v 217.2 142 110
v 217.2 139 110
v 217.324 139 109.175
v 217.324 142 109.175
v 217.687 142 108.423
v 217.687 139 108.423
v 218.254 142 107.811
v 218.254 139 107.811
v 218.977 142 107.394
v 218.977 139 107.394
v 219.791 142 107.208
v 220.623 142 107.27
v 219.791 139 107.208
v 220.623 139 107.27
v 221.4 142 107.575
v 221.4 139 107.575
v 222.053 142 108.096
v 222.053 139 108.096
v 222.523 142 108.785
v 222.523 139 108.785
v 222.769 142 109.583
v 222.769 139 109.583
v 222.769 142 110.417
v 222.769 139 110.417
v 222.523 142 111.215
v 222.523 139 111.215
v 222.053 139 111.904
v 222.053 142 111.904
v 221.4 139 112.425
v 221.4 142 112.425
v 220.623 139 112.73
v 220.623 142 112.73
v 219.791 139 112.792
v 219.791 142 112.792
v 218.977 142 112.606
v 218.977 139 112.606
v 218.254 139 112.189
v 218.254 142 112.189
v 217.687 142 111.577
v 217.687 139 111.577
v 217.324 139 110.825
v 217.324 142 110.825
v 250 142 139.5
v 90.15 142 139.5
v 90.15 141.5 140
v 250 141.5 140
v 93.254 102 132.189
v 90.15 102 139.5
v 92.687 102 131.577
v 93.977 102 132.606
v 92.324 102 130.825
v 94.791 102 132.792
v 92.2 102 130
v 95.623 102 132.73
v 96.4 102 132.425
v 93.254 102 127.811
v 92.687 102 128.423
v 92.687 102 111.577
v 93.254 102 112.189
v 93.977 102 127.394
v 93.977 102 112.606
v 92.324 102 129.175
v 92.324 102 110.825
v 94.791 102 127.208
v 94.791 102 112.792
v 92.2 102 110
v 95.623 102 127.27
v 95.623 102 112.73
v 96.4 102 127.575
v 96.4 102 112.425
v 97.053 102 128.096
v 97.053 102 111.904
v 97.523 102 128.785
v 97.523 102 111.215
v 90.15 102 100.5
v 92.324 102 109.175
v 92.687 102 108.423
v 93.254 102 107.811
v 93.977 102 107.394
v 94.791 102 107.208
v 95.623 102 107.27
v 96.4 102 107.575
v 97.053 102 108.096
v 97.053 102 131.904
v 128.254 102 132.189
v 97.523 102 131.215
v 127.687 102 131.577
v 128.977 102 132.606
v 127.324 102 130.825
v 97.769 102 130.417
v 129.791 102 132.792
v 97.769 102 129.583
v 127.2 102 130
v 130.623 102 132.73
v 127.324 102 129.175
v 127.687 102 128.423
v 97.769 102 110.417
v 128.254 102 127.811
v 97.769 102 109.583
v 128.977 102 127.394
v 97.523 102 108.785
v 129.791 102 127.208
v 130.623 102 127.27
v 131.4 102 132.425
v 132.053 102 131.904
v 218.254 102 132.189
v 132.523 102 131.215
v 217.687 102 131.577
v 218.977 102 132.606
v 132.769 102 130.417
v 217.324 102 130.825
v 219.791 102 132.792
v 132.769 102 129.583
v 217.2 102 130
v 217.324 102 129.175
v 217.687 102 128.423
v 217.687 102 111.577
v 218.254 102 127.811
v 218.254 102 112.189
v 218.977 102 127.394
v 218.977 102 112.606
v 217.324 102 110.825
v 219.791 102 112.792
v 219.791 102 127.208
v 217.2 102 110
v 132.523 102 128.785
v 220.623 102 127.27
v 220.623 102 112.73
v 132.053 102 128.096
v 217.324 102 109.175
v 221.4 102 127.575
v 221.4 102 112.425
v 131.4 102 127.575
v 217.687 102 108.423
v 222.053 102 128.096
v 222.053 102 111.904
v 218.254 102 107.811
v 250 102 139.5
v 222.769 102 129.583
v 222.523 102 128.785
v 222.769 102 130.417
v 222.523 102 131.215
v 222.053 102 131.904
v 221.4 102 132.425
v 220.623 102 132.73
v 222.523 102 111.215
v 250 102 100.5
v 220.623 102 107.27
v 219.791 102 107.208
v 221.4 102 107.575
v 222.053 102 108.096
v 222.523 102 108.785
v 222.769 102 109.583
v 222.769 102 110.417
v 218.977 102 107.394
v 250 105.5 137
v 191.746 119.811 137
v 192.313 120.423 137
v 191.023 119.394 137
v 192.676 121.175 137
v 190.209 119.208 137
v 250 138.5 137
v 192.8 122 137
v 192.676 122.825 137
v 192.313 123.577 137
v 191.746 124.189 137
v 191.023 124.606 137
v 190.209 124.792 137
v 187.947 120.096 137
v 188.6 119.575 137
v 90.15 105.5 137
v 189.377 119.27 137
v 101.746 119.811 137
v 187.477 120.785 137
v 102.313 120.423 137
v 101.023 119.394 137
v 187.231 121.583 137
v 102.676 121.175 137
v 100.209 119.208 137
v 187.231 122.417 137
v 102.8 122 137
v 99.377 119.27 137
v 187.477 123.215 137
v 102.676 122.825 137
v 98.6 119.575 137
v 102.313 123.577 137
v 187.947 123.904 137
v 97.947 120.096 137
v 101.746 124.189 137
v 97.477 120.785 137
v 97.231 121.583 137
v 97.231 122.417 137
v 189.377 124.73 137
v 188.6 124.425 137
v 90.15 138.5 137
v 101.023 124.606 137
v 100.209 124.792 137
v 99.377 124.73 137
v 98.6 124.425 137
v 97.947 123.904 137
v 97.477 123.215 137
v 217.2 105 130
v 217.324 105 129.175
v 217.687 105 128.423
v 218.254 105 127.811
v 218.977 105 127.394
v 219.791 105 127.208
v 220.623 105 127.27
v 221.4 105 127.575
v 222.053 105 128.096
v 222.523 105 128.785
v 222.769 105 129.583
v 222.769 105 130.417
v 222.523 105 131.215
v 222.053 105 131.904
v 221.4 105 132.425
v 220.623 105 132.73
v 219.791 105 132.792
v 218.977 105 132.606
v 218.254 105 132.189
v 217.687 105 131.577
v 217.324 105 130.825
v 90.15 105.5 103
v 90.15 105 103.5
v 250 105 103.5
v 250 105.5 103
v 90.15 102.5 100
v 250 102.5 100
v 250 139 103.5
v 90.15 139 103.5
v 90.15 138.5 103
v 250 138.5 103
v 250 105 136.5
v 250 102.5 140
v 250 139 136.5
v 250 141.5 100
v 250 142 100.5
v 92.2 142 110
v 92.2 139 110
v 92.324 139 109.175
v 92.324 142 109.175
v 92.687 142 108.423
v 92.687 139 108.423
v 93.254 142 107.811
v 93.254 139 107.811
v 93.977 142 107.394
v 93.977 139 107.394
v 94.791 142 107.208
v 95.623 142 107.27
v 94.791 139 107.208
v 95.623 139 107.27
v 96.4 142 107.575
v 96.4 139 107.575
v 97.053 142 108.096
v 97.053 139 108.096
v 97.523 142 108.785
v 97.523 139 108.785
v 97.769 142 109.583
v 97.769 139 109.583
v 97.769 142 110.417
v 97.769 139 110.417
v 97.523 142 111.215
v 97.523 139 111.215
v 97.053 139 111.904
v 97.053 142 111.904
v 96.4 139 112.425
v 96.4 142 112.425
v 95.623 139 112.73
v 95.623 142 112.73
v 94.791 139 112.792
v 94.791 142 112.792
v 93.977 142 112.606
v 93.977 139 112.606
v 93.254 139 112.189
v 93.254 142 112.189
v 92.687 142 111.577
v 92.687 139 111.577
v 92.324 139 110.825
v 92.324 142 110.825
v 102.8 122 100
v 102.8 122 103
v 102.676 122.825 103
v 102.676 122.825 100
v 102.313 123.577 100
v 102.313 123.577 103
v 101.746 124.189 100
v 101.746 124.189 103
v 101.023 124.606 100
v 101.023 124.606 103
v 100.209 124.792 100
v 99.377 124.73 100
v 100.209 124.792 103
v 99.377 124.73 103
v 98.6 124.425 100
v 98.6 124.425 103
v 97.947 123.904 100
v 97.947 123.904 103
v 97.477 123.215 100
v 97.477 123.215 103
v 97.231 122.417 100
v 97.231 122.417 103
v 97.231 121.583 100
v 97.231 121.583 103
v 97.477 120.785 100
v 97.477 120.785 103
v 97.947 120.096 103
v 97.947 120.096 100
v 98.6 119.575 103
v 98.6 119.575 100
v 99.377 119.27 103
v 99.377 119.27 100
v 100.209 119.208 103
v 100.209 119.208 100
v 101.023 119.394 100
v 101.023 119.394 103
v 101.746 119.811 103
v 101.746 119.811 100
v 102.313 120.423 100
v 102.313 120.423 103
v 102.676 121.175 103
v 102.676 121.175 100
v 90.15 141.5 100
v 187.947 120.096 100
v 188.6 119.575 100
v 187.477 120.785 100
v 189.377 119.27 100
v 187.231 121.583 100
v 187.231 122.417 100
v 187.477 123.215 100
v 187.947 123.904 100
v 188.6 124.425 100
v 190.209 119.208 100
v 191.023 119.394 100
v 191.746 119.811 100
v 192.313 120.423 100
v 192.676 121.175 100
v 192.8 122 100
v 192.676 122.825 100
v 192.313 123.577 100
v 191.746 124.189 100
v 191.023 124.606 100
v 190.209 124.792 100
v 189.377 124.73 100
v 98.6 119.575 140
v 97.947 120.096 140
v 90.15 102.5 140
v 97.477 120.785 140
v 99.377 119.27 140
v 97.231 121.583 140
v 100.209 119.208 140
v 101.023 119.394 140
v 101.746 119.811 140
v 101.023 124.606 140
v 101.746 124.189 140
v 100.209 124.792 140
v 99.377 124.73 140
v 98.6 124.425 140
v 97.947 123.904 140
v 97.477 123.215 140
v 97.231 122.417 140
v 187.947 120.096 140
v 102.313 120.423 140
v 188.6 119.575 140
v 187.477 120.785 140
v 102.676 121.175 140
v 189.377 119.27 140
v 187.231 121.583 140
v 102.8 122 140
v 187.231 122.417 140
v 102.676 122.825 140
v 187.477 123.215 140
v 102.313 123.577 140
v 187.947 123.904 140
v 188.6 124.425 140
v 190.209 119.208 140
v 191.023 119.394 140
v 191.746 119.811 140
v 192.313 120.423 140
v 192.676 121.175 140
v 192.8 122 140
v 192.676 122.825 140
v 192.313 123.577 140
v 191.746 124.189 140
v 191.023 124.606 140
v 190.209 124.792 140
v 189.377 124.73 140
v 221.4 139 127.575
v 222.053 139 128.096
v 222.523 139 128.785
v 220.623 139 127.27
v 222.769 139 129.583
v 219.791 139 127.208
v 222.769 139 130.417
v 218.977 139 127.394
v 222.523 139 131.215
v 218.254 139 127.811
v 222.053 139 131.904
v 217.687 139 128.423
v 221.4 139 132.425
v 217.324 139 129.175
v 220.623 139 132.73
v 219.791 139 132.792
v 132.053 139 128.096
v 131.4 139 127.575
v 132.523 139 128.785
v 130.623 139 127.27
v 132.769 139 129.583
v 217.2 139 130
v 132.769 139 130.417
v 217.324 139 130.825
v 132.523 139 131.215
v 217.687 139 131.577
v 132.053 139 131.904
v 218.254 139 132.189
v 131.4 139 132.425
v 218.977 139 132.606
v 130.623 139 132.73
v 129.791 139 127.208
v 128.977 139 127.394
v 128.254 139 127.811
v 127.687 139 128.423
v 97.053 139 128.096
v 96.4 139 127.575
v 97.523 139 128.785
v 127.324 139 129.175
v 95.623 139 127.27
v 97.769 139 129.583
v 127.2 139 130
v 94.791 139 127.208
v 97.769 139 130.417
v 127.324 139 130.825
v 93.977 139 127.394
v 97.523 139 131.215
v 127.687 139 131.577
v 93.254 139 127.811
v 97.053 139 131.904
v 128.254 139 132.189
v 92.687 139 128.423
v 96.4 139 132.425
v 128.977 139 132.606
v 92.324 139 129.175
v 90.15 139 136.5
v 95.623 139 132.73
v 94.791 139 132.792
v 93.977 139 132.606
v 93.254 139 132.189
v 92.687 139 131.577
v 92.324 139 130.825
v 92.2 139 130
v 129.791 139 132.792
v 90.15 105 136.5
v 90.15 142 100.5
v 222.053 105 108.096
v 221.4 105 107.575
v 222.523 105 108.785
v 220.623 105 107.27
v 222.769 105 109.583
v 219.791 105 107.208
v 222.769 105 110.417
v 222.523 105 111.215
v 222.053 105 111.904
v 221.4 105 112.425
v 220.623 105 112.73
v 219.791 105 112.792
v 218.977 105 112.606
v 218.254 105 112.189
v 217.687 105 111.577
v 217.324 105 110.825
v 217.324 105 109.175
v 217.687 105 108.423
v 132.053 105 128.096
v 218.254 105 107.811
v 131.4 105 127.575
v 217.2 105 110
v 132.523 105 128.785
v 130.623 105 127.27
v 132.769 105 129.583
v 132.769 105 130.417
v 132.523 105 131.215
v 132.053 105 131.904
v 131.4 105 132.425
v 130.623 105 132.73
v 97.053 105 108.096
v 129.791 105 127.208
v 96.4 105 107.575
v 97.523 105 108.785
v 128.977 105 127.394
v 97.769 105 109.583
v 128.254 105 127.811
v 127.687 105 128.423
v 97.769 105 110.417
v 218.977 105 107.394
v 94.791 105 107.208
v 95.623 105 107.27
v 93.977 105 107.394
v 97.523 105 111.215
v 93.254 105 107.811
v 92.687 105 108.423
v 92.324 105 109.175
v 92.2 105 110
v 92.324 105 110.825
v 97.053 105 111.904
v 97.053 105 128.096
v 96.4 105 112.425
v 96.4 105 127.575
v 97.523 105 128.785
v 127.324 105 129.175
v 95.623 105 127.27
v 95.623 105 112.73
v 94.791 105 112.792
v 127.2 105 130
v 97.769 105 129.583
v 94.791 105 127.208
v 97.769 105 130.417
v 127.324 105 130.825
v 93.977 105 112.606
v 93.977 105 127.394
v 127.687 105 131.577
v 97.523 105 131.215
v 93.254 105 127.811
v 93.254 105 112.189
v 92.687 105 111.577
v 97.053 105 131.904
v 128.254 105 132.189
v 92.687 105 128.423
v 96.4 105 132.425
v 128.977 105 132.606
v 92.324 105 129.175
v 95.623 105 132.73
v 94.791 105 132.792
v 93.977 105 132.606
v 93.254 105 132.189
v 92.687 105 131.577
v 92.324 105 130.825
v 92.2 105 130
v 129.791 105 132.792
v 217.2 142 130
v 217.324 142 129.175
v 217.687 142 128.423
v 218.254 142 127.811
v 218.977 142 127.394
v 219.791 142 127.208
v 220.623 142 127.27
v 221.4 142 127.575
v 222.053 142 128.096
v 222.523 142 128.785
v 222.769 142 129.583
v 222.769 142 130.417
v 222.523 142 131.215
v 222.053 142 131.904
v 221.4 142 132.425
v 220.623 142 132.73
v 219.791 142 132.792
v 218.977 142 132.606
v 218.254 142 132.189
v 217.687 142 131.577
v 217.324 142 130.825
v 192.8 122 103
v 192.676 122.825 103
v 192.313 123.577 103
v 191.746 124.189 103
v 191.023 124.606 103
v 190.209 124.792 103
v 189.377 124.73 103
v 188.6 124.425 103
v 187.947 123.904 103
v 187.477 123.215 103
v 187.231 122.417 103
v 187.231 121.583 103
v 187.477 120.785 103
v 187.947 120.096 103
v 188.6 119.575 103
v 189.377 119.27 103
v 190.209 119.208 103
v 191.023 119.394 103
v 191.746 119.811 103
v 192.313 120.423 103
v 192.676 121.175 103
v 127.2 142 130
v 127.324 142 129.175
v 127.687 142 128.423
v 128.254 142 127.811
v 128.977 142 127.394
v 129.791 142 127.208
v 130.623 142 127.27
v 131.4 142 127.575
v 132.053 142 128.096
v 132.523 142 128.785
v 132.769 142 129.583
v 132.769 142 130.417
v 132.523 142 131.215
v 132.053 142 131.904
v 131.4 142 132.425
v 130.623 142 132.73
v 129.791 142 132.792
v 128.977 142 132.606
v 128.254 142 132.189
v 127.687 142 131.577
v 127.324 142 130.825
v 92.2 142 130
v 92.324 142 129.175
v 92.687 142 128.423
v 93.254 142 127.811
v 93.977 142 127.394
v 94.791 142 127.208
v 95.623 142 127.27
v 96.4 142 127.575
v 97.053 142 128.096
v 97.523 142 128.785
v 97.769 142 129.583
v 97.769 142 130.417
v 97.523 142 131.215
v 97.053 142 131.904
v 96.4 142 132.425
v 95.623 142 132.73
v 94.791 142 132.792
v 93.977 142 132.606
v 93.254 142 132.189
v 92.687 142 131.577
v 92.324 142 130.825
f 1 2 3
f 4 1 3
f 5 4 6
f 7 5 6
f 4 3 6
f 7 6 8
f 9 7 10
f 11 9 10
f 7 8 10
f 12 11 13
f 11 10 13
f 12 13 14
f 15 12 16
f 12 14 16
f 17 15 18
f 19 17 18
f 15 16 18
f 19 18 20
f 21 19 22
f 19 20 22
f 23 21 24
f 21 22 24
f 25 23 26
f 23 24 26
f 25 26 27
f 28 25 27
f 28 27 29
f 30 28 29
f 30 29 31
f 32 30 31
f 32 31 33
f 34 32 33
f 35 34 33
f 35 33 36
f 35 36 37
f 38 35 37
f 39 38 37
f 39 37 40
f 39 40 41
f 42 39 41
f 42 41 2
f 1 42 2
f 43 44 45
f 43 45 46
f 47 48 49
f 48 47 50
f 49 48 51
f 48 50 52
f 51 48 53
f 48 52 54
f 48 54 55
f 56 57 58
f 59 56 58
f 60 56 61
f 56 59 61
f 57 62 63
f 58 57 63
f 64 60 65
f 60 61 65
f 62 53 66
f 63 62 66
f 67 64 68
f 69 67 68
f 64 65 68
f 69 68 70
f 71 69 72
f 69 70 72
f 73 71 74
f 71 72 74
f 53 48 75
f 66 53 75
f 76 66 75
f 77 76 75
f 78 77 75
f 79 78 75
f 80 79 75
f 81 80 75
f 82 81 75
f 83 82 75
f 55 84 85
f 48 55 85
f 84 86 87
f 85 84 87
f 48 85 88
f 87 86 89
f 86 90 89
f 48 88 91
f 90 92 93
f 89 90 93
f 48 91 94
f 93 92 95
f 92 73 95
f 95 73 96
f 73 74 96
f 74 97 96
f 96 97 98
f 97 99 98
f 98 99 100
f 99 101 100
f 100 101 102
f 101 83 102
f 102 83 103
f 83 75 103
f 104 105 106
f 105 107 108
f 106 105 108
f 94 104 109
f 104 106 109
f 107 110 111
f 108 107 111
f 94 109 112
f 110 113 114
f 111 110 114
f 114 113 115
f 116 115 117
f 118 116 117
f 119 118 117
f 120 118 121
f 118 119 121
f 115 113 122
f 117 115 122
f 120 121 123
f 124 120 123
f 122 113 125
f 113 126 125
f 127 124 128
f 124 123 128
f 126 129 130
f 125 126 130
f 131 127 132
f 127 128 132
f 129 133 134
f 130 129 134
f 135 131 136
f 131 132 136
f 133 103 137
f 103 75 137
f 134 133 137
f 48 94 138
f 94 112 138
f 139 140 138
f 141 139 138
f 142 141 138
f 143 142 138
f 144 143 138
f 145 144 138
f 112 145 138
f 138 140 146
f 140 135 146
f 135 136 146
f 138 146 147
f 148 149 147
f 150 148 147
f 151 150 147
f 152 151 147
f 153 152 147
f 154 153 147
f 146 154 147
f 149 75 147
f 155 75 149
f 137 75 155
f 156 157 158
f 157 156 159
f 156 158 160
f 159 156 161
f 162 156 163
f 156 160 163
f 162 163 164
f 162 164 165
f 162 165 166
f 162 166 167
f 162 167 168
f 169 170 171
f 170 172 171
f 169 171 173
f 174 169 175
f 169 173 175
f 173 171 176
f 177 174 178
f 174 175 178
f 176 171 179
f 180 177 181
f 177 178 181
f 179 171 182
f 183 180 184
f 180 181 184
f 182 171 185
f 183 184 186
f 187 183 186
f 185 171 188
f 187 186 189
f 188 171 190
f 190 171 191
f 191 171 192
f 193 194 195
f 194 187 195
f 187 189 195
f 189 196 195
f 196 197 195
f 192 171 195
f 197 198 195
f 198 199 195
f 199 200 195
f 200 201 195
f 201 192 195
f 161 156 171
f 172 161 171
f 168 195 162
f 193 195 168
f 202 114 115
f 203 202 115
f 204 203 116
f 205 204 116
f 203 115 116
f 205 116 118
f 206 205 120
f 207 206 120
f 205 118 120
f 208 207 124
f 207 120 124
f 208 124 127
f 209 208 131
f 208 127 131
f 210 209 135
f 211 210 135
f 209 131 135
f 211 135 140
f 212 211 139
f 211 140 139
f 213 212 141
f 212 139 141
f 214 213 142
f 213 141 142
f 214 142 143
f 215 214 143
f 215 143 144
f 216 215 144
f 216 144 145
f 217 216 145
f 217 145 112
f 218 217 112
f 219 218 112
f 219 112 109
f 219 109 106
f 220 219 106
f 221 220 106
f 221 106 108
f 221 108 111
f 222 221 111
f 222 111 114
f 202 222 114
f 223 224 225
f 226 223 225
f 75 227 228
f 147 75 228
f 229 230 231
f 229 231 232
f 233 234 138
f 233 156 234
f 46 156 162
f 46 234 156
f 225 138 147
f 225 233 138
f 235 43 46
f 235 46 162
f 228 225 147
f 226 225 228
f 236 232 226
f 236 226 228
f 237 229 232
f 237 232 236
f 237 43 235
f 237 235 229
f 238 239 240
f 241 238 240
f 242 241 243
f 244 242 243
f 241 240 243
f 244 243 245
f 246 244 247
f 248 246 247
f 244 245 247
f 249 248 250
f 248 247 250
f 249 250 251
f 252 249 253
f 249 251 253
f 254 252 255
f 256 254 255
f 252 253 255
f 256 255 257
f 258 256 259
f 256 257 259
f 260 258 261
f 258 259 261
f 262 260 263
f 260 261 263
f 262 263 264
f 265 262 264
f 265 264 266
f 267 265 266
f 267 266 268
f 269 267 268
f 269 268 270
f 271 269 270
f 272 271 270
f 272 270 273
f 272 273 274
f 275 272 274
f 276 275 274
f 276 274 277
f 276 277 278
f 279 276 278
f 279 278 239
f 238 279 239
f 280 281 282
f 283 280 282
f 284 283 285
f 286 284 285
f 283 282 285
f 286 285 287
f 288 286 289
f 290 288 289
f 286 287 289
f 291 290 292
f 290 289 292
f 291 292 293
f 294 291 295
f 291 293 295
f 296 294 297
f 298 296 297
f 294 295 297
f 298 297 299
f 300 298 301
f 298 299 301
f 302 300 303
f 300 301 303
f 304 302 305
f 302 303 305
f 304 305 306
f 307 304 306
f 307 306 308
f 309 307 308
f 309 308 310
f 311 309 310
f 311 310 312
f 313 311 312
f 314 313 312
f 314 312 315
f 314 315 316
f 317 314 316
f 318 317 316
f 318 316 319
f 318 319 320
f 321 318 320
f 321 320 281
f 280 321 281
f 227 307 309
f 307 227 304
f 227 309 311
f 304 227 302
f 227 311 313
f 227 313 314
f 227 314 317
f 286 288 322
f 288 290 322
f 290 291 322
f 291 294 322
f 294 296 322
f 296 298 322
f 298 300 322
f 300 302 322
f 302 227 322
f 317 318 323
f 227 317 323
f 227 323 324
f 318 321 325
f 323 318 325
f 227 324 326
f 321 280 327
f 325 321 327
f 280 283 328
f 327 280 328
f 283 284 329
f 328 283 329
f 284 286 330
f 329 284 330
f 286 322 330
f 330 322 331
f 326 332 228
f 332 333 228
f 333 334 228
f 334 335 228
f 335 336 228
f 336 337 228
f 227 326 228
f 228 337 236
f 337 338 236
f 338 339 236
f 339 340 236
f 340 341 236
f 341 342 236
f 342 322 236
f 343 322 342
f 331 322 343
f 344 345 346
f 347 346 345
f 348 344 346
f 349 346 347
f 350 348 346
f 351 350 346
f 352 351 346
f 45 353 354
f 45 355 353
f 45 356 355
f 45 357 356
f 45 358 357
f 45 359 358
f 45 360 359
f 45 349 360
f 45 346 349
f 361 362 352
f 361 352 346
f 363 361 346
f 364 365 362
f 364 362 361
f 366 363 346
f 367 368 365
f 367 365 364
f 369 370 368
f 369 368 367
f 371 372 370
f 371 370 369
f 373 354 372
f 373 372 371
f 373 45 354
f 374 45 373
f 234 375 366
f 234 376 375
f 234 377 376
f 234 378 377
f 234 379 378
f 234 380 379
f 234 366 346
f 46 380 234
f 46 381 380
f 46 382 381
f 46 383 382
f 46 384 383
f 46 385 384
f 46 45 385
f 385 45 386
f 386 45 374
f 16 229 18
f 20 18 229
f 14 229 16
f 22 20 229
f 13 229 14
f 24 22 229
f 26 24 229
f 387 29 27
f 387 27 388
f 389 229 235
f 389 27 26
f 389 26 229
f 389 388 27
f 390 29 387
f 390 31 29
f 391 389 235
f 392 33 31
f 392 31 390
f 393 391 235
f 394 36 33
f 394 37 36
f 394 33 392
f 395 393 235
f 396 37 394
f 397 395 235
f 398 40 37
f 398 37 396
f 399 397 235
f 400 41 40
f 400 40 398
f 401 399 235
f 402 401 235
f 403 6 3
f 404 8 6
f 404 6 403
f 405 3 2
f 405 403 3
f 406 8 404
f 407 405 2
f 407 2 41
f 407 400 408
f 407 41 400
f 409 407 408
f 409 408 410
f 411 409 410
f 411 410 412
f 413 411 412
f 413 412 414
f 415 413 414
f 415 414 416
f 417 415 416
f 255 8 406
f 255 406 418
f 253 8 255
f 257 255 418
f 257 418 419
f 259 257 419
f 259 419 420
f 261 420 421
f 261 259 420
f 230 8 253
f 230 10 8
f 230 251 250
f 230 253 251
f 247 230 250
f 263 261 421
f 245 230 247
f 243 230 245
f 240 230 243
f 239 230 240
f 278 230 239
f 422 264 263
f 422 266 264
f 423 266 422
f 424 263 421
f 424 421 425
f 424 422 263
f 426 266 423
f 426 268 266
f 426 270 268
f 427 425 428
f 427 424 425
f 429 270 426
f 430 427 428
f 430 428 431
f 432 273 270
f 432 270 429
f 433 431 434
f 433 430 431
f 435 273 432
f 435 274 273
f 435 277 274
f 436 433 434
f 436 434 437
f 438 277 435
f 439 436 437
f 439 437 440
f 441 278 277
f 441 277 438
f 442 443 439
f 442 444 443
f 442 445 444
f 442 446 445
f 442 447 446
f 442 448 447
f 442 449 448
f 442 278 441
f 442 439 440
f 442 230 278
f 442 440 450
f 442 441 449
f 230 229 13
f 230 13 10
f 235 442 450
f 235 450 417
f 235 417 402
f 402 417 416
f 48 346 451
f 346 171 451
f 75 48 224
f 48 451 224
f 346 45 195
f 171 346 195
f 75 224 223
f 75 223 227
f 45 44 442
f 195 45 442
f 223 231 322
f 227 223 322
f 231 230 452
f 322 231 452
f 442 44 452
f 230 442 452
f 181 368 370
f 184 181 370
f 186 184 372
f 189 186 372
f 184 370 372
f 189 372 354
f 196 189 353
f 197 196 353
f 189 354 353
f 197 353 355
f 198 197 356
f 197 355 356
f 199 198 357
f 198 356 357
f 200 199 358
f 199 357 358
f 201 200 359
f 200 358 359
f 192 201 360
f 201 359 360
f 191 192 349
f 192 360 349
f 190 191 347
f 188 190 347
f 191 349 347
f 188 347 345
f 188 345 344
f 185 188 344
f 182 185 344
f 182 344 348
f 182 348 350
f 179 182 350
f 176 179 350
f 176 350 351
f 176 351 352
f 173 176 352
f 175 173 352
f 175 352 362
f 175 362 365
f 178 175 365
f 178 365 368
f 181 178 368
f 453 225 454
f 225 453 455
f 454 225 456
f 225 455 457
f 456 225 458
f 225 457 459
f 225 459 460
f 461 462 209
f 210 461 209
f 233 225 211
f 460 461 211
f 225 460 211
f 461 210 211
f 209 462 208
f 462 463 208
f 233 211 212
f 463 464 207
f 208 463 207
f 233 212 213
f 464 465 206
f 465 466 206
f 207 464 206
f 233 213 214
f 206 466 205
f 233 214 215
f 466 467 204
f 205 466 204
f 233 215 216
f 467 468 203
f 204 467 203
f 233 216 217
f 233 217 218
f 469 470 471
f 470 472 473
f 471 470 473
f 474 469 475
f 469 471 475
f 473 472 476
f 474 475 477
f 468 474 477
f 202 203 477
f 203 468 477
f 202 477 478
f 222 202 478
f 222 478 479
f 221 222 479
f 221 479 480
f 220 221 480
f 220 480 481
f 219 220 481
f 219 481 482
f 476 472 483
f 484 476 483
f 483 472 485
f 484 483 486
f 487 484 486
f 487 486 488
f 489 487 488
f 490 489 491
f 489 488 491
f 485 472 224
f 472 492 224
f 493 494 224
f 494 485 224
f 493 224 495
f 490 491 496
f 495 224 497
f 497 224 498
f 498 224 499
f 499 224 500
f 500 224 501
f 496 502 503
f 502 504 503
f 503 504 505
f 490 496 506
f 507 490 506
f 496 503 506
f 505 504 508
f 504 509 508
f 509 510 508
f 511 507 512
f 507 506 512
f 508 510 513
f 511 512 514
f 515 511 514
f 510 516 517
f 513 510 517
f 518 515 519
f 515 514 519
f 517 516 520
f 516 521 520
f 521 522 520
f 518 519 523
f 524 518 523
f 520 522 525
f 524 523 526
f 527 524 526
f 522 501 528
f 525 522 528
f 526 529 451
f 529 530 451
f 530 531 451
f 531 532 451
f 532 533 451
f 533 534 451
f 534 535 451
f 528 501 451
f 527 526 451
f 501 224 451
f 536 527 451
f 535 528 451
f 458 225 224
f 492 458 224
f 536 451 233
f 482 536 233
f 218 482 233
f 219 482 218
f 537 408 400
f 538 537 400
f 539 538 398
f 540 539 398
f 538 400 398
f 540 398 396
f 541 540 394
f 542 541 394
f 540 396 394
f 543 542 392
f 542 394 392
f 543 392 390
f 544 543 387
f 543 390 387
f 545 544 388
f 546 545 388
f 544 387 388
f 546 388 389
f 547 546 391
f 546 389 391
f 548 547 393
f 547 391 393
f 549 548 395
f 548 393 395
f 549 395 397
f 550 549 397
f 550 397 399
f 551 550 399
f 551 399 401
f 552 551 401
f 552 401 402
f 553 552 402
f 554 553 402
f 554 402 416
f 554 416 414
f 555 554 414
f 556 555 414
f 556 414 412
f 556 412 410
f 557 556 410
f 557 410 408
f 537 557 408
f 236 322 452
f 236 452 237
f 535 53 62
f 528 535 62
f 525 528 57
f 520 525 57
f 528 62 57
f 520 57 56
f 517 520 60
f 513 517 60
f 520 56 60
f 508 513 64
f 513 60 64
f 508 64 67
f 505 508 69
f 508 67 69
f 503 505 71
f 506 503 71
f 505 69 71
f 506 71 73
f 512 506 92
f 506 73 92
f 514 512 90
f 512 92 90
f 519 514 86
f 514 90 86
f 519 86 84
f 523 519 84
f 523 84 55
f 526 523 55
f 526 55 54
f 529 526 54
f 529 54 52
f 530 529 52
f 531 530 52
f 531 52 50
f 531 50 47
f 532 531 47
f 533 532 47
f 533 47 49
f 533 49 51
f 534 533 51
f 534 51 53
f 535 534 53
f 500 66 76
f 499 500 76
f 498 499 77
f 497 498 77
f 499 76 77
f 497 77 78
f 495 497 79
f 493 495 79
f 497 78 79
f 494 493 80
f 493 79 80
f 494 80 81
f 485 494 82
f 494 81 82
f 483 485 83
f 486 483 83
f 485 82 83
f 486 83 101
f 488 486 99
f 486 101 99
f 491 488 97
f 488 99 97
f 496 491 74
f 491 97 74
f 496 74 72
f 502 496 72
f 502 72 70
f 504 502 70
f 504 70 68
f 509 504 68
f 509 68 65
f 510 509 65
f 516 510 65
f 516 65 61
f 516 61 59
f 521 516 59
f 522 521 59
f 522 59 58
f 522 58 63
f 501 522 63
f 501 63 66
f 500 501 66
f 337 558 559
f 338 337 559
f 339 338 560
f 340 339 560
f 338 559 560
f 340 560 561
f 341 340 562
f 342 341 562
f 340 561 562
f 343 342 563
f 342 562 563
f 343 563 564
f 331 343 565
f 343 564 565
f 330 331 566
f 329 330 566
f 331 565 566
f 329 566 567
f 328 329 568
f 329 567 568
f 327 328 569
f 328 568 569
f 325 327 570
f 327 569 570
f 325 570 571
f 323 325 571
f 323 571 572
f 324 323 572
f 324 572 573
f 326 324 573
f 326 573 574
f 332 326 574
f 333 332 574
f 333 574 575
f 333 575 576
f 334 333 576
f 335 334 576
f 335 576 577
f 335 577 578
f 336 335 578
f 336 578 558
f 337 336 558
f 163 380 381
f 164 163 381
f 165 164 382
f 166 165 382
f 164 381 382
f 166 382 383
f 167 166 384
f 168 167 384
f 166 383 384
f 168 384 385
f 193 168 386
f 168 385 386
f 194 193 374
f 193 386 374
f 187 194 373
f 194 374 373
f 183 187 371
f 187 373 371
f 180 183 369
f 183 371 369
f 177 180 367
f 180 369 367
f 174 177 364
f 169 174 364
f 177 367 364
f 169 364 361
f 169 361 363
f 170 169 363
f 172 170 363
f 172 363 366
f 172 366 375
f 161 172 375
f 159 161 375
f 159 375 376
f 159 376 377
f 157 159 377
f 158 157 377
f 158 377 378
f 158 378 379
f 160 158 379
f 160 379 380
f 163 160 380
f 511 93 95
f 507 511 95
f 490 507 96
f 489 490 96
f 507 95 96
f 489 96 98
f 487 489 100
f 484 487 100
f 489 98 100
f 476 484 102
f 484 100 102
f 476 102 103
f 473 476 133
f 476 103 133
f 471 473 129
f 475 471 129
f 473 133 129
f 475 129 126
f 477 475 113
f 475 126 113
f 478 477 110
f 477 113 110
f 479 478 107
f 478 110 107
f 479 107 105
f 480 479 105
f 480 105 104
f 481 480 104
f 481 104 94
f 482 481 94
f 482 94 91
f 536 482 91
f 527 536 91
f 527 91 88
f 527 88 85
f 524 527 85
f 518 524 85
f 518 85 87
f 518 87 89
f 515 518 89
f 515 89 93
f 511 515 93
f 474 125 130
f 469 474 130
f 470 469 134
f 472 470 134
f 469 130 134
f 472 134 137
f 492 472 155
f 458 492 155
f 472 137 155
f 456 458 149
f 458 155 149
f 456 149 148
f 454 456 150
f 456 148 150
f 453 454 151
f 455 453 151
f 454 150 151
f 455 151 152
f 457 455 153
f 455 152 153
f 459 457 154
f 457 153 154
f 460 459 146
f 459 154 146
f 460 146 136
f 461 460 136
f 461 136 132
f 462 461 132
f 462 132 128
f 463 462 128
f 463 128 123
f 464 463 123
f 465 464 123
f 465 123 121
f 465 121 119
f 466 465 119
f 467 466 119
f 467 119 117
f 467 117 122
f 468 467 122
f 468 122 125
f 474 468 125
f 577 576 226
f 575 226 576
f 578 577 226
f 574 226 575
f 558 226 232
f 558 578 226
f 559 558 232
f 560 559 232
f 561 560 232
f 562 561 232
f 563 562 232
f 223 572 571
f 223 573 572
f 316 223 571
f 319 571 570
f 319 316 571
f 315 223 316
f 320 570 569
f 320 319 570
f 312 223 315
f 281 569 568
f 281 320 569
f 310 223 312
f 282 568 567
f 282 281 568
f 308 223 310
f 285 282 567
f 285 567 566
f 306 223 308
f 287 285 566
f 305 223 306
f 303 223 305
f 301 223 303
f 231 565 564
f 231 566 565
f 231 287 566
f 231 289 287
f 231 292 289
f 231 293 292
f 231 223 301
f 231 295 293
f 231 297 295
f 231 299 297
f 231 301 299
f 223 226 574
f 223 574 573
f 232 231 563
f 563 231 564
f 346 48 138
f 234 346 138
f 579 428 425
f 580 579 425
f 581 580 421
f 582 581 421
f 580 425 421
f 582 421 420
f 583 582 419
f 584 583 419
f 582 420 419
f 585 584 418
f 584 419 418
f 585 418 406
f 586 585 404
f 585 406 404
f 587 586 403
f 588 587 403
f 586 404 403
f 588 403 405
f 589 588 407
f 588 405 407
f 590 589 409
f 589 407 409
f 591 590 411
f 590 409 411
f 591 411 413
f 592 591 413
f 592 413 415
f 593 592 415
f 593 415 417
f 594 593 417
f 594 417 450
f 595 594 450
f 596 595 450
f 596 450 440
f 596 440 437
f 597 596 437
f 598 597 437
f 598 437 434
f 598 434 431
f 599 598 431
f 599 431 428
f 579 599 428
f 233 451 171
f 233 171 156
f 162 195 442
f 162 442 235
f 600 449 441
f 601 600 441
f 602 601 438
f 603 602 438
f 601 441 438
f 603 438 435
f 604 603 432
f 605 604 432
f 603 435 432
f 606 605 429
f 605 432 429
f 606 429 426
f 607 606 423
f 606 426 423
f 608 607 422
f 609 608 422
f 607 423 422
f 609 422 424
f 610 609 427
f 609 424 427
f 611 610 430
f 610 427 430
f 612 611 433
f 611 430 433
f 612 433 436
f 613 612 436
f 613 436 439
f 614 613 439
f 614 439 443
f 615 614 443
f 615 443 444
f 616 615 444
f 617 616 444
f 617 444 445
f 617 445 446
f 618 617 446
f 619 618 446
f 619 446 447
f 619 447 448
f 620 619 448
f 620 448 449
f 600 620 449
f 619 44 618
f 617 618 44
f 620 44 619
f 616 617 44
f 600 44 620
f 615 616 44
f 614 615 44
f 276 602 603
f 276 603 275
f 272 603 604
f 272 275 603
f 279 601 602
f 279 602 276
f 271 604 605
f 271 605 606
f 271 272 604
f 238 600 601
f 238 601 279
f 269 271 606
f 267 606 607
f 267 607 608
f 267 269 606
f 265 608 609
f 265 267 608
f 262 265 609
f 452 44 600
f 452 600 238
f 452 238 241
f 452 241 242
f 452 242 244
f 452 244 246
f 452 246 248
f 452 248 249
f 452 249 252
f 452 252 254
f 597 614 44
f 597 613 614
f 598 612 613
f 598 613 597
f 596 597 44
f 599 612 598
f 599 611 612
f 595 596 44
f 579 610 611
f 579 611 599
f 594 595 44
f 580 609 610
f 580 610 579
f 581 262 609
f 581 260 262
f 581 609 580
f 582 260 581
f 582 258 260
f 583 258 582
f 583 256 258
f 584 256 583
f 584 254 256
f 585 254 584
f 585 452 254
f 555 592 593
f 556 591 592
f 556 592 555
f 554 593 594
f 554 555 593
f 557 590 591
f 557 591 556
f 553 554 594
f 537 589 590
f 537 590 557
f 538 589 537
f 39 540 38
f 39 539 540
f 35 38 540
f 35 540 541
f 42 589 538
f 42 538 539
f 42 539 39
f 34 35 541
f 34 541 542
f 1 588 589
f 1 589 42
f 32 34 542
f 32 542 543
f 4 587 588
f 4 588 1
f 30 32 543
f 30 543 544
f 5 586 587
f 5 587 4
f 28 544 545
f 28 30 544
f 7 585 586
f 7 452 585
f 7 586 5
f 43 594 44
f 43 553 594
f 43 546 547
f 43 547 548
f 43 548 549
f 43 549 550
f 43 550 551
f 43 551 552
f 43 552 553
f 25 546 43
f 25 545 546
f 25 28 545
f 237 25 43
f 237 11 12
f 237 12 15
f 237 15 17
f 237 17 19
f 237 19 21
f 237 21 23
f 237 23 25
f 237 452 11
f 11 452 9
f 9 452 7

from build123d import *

# Parameters (mm, degrees)
SKETCH1_W                      = 159.85
SKETCH1_H                      = 40
BOSS_EXTRUDE1_DEPTH            = 40
SKETCH2_W                      = 34
SKETCH2_H                      = 34
CUT_EXTRUDE1_DEPTH             = 256.569995305
F_5_6_5_6_DIAMETER_HOLE1_D     = 5.6
F_5_6_5_6_DIAMETER_HOLE1_DEPTH = 3
F_5_6_5_6_DIAMETER_HOLE2_D     = 5.6
F_5_6_5_6_DIAMETER_HOLE2_DEPTH = 3
F_5_6_5_6_DIAMETER_HOLE3_D     = 5.6
F_5_6_5_6_DIAMETER_HOLE4_D     = 5.6
F_5_6_5_6_DIAMETER_HOLE4_DEPTH = 40
CHAMFER1_SIZE                  = 0.5


with BuildPart() as part:
    # Sketch1 → Boss-Extrude1 (new body)
    with BuildSketch(Plane(origin=(0, 142, 0), x_dir=(1, 0, 0), z_dir=(0, 1, 0))):
        with Locations((170.075, -120)):
            Rectangle(SKETCH1_W, SKETCH1_H)
    extrude(amount=-BOSS_EXTRUDE1_DEPTH)

    # Sketch2 → Cut-Extrude1 (cut, through all)
    with BuildSketch(Plane.ZY.offset(-90.15)):
        with Locations((120, 122)):
            Rectangle(SKETCH2_W, SKETCH2_H)
    extrude(amount=-CUT_EXTRUDE1_DEPTH, mode=Mode.SUBTRACT)

    # Ø5.6 (5.6) Diameter Hole1
    with Locations(Plane(origin=(0, 105, 0), x_dir=(1, 0, 0), z_dir=(0, 1, 0))):
        with Locations((220, -130), (220, -110), (130, -130), (95, -130), (95, -110)):
            Hole(F_5_6_5_6_DIAMETER_HOLE1_D / 2, depth=F_5_6_5_6_DIAMETER_HOLE1_DEPTH)

    # Ø5.6 (5.6) Diameter Hole2
    with Locations(Plane(origin=(0, 0, 100), x_dir=(-1, 0, 0), z_dir=(0, 0, -1))):
        with Locations((-190, 122), (-100, 122)):
            Hole(F_5_6_5_6_DIAMETER_HOLE2_D / 2, depth=F_5_6_5_6_DIAMETER_HOLE2_DEPTH)

    # Ø5.6 (5.6) Diameter Hole3 (through all)
    with Locations(Plane(origin=(0, 0, 137), x_dir=(-1, 0, 0), z_dir=(0, 0, -1))):
        with Locations((-190, 122), (-100, 122)):
            Hole(F_5_6_5_6_DIAMETER_HOLE3_D / 2)

    # Ø5.6 (5.6) Diameter Hole4
    with Locations(Plane(origin=(0, 142, 0), x_dir=(1, 0, 0), z_dir=(0, 1, 0))):
        with Locations((220, -130), (220, -110), (130, -130), (95, -130), (95, -110)):
            Hole(F_5_6_5_6_DIAMETER_HOLE4_D / 2, depth=F_5_6_5_6_DIAMETER_HOLE4_DEPTH)

    # Chamfer1
    chamfer1_edges = [part.edges().sort_by_distance(p)[0] for p in [
        (170.075, 102, 100),
        (170.075, 105, 103),
        (170.075, 139, 103),
        (170.075, 139, 137),
        (170.075, 105, 137),
        (170.075, 102, 140),
        (170.075, 142, 100),
        (170.075, 142, 140),
    ]]
    chamfer(chamfer1_edges, length=CHAMFER1_SIZE)


solid = part.part
